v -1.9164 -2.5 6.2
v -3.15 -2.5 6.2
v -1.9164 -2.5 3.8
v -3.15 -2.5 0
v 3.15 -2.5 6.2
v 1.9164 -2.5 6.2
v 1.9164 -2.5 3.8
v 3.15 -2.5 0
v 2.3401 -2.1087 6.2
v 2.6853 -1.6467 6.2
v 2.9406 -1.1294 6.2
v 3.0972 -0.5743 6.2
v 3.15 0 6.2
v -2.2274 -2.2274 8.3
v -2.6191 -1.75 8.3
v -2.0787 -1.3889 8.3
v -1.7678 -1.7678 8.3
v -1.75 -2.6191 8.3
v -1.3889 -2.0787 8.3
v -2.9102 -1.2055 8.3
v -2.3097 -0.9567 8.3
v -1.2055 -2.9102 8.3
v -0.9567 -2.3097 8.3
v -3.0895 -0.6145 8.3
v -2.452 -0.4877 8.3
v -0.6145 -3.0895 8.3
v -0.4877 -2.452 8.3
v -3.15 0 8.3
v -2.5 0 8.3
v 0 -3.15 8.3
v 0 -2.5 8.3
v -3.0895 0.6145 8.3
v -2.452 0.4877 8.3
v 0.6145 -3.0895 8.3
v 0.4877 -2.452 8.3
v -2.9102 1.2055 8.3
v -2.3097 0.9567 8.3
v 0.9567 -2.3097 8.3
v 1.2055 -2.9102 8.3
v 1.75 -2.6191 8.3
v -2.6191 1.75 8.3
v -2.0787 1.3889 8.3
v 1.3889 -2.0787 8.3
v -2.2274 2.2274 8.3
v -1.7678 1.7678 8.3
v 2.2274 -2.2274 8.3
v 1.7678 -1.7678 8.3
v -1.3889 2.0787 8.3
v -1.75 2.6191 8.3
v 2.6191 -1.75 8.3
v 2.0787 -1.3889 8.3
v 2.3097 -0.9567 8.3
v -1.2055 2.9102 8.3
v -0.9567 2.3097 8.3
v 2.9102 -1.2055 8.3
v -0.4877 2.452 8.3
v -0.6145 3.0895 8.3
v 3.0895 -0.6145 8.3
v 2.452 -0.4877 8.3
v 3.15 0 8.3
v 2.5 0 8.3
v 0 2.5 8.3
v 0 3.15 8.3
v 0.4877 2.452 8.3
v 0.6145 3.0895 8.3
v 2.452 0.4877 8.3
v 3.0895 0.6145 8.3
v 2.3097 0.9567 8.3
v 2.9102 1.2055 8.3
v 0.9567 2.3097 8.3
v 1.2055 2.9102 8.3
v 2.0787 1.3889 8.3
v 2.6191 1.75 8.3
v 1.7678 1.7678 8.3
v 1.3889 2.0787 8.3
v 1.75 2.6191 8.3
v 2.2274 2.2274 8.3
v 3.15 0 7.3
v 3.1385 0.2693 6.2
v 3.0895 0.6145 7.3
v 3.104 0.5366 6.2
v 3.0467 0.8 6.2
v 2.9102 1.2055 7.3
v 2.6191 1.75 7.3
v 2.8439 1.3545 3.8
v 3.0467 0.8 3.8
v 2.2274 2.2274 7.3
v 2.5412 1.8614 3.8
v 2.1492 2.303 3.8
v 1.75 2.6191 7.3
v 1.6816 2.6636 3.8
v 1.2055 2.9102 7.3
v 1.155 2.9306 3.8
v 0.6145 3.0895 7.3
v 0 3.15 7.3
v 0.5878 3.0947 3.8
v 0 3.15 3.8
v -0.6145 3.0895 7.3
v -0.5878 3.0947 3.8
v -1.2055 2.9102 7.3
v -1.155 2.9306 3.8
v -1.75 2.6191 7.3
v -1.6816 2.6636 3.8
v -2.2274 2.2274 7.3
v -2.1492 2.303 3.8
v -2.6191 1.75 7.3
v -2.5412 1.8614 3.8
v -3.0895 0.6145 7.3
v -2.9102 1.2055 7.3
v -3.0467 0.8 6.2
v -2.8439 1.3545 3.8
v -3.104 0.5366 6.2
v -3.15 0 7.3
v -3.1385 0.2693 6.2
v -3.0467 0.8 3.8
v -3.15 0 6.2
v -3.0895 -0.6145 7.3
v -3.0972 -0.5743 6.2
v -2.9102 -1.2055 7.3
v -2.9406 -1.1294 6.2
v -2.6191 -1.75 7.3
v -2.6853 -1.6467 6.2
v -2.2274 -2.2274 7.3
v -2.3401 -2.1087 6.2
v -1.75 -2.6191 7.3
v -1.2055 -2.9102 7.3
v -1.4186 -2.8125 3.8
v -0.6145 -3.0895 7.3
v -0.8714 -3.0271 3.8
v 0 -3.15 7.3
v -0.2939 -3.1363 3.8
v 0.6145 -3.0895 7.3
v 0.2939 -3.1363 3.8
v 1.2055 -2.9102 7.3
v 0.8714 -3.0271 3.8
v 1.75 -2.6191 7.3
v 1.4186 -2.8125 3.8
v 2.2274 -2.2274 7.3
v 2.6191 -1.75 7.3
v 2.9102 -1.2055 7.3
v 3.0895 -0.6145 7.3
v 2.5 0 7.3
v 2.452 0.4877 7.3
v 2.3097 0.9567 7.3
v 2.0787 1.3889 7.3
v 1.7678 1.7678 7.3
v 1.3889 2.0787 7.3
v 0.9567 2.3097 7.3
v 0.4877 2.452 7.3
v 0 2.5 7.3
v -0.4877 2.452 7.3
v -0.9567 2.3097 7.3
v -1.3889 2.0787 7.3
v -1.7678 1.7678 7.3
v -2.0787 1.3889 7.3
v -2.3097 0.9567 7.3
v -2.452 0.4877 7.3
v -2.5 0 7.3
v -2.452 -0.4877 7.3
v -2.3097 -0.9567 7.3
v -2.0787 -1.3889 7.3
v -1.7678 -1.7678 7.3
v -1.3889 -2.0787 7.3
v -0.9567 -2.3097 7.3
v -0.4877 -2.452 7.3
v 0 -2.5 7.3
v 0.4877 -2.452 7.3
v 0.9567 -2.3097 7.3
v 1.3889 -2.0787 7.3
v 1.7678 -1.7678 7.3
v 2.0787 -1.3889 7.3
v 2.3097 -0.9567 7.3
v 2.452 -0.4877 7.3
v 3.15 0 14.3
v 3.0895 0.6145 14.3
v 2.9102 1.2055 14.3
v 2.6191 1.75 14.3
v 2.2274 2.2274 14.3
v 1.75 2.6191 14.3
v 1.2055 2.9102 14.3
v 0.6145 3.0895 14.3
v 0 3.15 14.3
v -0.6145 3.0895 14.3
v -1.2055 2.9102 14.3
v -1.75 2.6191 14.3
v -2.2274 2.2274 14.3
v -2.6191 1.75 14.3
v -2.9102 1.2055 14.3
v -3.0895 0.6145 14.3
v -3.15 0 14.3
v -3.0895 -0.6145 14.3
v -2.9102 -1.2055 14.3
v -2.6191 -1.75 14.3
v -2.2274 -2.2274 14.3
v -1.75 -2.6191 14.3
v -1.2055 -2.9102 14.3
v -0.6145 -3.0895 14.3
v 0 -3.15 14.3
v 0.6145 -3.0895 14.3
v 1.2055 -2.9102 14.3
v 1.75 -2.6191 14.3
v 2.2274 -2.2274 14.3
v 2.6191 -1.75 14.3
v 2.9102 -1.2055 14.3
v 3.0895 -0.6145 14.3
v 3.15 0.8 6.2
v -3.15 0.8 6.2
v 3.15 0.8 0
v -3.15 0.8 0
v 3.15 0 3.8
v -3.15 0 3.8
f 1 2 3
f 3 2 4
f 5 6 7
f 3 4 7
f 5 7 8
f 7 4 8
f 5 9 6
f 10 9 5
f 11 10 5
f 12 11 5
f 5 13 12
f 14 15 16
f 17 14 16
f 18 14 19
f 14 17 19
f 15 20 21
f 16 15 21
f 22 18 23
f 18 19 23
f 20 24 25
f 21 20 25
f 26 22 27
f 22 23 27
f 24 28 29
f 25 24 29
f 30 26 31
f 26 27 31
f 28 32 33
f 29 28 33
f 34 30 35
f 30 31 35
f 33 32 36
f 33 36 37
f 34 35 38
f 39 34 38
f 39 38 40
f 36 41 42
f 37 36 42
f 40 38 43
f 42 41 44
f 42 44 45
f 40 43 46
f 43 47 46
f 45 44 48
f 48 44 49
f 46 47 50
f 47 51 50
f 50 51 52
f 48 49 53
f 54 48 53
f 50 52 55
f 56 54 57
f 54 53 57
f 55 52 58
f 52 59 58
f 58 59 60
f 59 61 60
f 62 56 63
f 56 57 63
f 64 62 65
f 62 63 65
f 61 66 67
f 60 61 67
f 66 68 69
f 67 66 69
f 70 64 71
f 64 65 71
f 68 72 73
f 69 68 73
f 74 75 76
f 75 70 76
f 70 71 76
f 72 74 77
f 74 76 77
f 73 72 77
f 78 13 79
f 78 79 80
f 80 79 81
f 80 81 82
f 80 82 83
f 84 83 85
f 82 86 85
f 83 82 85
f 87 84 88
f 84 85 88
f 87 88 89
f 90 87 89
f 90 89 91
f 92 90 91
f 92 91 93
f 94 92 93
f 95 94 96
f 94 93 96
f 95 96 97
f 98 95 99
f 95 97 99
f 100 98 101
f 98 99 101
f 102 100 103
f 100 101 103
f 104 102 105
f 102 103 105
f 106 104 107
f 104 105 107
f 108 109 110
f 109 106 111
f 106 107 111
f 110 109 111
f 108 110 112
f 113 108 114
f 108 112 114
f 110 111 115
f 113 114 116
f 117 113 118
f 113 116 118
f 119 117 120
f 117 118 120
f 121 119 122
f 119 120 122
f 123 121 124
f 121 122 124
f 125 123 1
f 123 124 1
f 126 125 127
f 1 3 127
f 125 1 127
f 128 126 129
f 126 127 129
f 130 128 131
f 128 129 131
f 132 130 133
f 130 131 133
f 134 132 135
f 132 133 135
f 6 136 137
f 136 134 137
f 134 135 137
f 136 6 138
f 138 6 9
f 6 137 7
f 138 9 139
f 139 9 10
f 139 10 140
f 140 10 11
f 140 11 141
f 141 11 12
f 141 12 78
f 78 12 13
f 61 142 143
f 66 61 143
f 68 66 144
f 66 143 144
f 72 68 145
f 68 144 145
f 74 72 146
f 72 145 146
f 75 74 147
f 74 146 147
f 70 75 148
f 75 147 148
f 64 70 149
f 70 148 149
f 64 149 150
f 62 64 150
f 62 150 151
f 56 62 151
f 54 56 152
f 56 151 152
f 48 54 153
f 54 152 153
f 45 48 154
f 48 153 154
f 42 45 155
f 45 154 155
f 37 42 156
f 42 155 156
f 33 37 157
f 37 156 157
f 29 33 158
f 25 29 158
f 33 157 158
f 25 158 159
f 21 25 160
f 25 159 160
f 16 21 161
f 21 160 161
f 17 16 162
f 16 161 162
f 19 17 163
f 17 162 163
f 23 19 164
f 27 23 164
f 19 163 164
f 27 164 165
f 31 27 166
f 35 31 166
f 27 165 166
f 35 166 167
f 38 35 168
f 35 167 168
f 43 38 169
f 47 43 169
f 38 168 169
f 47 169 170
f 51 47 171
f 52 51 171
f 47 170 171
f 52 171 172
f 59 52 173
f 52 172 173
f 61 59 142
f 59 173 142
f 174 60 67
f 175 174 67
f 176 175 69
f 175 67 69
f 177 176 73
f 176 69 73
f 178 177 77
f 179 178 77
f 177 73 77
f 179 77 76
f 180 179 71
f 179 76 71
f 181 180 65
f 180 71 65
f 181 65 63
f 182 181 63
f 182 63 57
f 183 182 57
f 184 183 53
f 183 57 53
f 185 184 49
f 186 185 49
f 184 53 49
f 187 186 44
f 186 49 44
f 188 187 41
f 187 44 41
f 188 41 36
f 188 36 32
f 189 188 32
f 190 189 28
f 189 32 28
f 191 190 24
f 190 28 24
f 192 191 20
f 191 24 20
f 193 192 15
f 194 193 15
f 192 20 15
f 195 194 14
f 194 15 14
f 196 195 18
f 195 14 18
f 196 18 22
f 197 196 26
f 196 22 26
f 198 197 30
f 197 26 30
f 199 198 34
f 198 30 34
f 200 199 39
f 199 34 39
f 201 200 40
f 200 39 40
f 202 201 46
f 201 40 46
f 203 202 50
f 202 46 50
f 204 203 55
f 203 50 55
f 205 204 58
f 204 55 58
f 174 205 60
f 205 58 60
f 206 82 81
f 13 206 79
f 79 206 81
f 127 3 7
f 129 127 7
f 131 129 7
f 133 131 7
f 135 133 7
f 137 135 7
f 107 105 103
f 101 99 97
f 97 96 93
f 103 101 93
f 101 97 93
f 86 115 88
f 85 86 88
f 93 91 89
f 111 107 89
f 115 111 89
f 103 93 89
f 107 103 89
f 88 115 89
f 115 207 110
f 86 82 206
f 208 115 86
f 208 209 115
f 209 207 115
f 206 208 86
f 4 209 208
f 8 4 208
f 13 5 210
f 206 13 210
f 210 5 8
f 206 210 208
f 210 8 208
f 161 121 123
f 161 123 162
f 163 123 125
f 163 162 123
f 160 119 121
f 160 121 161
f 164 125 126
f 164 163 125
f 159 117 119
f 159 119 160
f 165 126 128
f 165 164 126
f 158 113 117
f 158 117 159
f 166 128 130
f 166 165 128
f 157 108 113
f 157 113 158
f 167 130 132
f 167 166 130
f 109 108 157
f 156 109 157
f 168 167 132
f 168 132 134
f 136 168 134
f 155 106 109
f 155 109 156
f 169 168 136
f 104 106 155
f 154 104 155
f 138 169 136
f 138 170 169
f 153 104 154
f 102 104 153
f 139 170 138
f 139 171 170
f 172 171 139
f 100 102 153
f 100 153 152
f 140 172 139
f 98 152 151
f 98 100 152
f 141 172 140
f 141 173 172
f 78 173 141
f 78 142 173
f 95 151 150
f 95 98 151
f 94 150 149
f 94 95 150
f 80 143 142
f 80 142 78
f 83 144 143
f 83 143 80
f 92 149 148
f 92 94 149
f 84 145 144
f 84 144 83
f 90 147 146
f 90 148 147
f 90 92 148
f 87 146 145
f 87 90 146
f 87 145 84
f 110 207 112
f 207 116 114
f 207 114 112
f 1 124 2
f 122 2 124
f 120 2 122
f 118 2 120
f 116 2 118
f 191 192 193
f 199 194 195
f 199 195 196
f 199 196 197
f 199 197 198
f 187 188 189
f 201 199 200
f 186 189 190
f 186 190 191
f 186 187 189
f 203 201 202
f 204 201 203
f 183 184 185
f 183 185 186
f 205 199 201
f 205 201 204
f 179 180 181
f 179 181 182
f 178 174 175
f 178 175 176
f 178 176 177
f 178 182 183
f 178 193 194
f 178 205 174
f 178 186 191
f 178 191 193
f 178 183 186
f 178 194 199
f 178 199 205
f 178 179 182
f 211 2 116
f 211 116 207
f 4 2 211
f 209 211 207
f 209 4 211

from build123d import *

# Parameters (mm, degrees)
F0_W     = 6.3
F0_H     = 3.3
F1_DEPTH = 6.2
F3_R     = 3.15
F4_DEPTH = 3.5
F5_R     = 2.5
F6_DEPTH = 1
F7_R     = 3.15
F8_DEPTH = 6


with BuildPart() as f1:
    # F0 (on Top) → F1 (new body)
    with BuildSketch(Plane.XY):
        with Locations((0, -0.85)):
            Rectangle(F0_W, F0_H)
    extrude(amount=F1_DEPTH)

    # F3 (on offset) → F4 (join)
    with BuildSketch(Plane.XY.offset(3.8)):
        Circle(F3_R)
    extrude(amount=F4_DEPTH)

    # F5 (on face) → F6 (join)
    with BuildSketch(Plane.XY.offset(7.3)):
        Circle(F5_R)
    extrude(amount=F6_DEPTH)

    # F7 (on face) → F8 (join)
    with BuildSketch(Plane.XY.offset(8.3)):
        Circle(F7_R)
    extrude(amount=F8_DEPTH)


solid = f1.part
